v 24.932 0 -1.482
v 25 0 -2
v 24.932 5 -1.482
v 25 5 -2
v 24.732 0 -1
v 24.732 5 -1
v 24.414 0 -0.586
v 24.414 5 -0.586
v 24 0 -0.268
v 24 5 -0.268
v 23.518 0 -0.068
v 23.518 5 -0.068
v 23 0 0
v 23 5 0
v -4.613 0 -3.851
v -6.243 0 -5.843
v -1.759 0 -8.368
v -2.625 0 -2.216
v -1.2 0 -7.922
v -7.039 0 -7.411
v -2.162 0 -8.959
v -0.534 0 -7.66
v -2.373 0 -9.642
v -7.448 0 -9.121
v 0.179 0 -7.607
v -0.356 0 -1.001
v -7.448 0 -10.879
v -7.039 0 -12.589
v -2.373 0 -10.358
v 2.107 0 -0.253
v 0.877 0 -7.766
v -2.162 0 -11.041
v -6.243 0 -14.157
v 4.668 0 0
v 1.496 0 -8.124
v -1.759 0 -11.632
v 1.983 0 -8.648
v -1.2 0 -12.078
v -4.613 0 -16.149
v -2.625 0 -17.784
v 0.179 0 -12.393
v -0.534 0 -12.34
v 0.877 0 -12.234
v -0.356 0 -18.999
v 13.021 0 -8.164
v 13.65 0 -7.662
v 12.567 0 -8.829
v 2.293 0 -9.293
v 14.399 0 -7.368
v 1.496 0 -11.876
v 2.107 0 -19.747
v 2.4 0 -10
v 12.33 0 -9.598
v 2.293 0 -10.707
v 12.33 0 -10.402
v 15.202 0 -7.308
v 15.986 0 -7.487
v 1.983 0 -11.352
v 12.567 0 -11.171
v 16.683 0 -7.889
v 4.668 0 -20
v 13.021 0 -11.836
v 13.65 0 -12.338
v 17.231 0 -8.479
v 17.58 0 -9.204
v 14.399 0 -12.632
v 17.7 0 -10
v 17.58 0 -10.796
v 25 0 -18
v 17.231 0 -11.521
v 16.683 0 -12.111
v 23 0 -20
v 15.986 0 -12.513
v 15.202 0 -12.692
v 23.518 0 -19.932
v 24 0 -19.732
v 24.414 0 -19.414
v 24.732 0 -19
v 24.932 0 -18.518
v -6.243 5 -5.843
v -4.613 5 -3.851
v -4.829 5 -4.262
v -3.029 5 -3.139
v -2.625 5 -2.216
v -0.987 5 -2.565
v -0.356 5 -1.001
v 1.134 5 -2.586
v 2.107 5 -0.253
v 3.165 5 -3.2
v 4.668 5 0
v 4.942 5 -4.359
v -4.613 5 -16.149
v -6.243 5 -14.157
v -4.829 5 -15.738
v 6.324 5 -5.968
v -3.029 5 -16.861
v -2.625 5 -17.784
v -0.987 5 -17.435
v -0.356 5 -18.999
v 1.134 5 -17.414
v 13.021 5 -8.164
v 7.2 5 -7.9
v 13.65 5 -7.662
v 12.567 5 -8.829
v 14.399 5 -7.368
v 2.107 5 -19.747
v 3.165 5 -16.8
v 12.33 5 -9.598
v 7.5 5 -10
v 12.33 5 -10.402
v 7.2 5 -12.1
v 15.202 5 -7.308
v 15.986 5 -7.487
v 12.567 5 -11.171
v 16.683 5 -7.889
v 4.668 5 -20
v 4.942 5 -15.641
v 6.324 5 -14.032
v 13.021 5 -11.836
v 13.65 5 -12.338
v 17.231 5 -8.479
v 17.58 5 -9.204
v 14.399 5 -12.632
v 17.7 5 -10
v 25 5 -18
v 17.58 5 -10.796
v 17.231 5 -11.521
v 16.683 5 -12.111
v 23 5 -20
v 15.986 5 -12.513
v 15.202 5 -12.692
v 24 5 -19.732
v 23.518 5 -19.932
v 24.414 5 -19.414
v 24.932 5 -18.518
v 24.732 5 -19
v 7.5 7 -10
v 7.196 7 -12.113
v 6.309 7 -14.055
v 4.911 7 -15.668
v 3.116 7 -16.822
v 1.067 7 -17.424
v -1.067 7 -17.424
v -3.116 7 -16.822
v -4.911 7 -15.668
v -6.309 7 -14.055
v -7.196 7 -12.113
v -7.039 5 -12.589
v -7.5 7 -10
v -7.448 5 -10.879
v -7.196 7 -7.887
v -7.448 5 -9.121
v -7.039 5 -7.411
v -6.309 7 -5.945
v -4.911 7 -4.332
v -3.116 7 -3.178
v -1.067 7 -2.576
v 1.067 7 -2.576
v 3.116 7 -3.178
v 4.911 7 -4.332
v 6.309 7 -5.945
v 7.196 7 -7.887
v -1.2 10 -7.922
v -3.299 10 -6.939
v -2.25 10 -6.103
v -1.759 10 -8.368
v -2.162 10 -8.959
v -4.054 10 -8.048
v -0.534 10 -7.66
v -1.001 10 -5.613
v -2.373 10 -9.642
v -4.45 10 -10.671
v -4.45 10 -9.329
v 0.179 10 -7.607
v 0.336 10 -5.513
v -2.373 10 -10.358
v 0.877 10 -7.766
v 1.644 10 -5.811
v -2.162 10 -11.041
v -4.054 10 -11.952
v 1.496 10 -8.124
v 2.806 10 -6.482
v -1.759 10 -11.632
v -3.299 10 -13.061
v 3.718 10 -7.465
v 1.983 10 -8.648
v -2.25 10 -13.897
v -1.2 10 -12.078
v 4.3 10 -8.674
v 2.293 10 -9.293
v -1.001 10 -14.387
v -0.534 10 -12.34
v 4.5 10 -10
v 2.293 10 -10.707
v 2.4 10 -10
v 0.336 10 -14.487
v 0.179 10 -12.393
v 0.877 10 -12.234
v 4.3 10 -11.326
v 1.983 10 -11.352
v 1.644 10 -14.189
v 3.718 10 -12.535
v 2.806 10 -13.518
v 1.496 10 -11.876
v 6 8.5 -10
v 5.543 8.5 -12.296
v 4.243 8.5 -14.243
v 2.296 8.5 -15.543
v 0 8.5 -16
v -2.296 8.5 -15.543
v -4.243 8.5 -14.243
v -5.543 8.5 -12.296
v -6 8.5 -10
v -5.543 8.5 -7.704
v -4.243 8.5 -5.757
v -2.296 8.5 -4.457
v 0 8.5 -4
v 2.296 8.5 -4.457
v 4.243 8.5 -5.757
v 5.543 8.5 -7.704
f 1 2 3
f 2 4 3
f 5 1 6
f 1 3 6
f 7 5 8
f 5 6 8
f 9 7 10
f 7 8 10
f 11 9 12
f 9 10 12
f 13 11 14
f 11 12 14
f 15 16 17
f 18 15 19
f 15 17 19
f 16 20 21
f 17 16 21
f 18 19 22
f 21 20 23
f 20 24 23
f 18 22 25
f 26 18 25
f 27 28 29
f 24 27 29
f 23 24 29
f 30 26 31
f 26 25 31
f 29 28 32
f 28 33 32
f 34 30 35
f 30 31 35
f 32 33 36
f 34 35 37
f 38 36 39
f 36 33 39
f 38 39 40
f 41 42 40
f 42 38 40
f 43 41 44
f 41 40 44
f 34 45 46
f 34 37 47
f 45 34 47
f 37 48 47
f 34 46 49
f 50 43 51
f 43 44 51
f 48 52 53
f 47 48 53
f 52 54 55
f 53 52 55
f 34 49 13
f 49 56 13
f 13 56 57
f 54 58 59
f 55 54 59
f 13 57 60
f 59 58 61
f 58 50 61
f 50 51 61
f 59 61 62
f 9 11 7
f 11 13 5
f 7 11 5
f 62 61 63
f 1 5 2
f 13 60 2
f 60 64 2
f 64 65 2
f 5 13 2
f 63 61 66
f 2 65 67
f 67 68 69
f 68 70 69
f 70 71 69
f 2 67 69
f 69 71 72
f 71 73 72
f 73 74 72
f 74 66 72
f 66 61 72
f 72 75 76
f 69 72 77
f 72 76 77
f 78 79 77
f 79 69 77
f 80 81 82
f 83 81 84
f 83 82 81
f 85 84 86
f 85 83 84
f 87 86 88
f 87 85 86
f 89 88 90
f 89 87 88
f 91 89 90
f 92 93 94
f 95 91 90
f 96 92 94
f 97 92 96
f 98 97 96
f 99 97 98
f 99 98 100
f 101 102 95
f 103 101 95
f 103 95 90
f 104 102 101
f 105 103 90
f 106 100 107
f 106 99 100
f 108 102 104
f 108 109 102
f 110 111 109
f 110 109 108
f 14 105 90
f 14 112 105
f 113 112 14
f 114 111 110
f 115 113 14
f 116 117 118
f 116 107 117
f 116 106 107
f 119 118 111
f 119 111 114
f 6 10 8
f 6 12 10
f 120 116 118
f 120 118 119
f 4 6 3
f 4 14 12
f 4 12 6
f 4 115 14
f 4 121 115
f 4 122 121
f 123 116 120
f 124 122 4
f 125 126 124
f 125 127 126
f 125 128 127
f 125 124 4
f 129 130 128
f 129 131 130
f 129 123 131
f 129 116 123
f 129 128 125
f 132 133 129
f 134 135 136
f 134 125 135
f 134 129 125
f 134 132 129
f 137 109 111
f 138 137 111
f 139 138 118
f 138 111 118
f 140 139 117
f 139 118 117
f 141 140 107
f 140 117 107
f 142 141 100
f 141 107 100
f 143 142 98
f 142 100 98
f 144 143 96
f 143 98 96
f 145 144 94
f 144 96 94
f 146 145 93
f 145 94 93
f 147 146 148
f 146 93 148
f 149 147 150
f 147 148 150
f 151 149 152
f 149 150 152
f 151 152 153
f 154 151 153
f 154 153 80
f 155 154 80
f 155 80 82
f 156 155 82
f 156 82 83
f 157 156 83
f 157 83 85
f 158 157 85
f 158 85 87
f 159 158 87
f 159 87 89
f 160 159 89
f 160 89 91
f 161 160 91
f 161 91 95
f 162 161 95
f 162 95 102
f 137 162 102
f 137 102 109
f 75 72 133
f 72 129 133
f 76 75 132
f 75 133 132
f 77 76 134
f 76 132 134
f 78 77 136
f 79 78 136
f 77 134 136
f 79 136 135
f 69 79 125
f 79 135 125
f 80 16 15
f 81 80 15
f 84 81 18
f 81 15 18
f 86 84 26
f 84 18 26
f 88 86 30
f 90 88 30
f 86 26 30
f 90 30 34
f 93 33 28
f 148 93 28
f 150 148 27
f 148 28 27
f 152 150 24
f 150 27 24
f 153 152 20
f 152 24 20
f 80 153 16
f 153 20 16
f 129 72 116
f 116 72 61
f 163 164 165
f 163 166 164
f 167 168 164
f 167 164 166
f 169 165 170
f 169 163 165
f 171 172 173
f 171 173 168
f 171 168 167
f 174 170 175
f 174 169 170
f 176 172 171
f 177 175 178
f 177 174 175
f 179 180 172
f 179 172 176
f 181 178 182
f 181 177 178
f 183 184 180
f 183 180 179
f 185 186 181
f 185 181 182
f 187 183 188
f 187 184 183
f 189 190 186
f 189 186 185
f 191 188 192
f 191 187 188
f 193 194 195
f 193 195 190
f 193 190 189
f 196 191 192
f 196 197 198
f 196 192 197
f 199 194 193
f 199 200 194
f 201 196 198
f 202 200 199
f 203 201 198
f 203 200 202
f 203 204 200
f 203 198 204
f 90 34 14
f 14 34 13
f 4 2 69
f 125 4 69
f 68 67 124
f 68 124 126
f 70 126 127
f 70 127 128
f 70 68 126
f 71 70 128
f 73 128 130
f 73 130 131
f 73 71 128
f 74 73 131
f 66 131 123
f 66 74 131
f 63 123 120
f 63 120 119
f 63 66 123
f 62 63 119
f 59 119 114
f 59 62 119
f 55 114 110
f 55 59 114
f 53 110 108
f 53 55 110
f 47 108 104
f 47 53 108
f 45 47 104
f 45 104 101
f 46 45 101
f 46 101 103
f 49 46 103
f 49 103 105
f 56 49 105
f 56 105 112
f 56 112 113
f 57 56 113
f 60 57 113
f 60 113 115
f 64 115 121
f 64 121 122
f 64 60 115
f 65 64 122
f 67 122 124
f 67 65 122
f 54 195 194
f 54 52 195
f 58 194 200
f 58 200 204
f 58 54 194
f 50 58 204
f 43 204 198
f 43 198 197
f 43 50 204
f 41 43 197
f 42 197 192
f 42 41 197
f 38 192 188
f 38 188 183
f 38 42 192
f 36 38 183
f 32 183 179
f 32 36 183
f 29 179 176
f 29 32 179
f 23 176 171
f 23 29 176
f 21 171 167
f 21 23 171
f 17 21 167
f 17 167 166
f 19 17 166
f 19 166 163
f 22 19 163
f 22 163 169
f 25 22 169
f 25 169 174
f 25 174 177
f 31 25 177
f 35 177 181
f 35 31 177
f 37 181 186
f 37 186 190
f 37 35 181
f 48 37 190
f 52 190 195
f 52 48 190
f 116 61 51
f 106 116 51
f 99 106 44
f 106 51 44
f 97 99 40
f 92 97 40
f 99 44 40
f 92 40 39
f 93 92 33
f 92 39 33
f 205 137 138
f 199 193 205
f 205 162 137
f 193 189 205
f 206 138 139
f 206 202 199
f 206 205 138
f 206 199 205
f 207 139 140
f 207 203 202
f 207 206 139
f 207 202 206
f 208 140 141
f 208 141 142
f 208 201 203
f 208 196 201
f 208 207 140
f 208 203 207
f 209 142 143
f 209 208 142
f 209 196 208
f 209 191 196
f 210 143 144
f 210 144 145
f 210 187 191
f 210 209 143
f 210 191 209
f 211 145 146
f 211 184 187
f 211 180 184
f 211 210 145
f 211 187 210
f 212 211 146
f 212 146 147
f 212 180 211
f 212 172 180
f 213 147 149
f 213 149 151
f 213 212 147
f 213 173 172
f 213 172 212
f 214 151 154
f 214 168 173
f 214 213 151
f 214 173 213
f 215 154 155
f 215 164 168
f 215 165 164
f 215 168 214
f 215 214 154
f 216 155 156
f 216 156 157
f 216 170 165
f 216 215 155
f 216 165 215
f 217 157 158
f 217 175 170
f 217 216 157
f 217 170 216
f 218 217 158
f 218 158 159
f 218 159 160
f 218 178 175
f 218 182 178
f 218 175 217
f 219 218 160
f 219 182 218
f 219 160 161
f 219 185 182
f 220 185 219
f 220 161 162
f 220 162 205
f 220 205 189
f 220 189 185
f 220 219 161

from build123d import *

# Parameters (mm, degrees)
SKETCH1_R           = 2.7
SKETCH1_R_2         = 2.4
BOSS_EXTRUDE1_DEPTH = 5
SKETCH2_R           = 7.5
SKETCH2_R_2         = 2.4
BOSS_EXTRUDE2_DEPTH = 5
CHAMFER1_SIZE       = 3
FILLET1_R           = 2


with BuildPart() as part:
    # Sketch1 → Boss-Extrude1 (new body)
    with BuildSketch(Plane(origin=(0, 0, 0), x_dir=(1, 0, 0), z_dir=(0, 1, 0))):
        with BuildLine():
            Line((4.667976007, 0), (25, 0))
            Line((25, 0), (25, 20))
            Line((25, 20), (4.667976007, 20))
            ThreePointArc((4.667976007, 20), (-1.520553083, 18.447162124), (-6.242835244, 14.156562054))
            ThreePointArc((-6.242835244, 14.156562054), (-7.5, 10), (-6.242835244, 5.843437946))
            ThreePointArc((-6.242835244, 5.843437946), (-1.520553083, 1.552837876), (4.667976007, 0))
        make_face()
        with Locations((15, 10)):
            Circle(SKETCH1_R, mode=Mode.SUBTRACT)
        with Locations((0, 10)):
            Circle(SKETCH1_R_2, mode=Mode.SUBTRACT)
    extrude(amount=BOSS_EXTRUDE1_DEPTH)

    # Sketch2 → Boss-Extrude2 (add)
    with BuildSketch(Plane(origin=(0, 5, 0), x_dir=(1, 0, 0), z_dir=(0, 1, 0))):
        with Locations((0, 10)):
            Circle(SKETCH2_R)
        with Locations((0, 10)):
            Circle(SKETCH2_R_2, mode=Mode.SUBTRACT)
    extrude(amount=BOSS_EXTRUDE2_DEPTH)

    # Chamfer1
    chamfer1_edges = [part.edges().sort_by_distance(p)[0] for p in [
        (-7.5, 10, -10),
    ]]
    chamfer(chamfer1_edges, length=CHAMFER1_SIZE)

    # Fillet1
    fillet1_edges = [part.edges().sort_by_distance(p)[0] for p in [
        (25, 2.5, -20),
        (25, 2.5, 0),
    ]]
    fillet(fillet1_edges, radius=FILLET1_R)


solid = part.part
